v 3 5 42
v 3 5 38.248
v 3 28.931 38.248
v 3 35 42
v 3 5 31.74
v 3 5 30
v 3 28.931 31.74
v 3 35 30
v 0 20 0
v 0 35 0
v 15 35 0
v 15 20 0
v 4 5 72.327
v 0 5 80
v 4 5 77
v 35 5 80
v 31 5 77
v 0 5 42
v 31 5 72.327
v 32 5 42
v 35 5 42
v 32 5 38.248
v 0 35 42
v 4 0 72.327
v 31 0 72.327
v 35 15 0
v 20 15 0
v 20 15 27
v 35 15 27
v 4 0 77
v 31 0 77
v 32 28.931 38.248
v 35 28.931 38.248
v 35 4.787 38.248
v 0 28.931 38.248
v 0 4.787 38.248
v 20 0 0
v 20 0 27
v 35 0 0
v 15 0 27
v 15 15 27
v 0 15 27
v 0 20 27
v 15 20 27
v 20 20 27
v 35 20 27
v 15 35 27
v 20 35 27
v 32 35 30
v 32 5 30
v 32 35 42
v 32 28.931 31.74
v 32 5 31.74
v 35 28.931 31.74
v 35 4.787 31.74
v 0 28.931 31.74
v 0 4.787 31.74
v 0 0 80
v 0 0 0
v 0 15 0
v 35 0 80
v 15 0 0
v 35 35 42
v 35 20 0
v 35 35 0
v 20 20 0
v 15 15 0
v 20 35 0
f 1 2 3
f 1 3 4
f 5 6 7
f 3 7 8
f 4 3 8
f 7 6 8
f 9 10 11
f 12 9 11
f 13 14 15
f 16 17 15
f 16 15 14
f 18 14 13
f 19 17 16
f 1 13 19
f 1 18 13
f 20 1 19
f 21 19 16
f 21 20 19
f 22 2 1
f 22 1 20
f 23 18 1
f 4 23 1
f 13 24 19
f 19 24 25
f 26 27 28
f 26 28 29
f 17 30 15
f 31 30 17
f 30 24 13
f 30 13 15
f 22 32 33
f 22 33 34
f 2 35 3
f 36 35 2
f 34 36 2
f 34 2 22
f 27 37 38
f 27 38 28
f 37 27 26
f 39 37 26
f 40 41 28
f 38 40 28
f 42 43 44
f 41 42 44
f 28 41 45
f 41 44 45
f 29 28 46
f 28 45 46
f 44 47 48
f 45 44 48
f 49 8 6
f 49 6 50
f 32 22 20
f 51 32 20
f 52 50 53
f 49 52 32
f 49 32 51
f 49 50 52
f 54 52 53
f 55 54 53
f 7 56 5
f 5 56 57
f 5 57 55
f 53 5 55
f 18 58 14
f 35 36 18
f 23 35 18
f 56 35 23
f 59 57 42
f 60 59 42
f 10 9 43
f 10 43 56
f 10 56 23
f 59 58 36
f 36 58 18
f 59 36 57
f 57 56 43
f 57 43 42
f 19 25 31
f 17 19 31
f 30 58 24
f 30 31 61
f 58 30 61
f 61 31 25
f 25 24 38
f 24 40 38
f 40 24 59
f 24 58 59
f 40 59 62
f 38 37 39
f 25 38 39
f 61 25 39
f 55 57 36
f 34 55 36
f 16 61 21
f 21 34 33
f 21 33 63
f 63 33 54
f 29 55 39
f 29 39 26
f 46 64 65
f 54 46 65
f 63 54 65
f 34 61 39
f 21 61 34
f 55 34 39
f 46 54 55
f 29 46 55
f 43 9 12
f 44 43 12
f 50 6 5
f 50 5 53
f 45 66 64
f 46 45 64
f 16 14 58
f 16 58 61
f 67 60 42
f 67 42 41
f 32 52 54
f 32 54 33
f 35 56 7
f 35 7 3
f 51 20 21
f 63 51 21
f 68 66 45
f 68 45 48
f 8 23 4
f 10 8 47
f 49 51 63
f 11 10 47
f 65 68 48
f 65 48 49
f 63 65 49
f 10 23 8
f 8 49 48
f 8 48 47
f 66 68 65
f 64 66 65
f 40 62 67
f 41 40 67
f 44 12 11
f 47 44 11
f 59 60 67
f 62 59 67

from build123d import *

# Parameters (mm, degrees)
F0_W      = 15
F0_H      = 15
F1_DEPTH  = 30
F3_W      = 35
F3_H      = 35
F4_DEPTH  = 3
F5_W      = 35
F5_H      = 5
F6_DEPTH  = 50
F7_W      = 27
F7_H      = 4.6730685326
F8_DEPTH  = 25
F9_W      = 3
F9_H      = 30
F10_DEPTH = 12
F12_W     = 24.1443798877
F12_H     = 6.5082572401
F11_W     = 23.8036615774
F11_H     = 4.3690986931
F13_DEPTH = 349


with BuildPart() as f1:
    # F0 (on Top) → F1 (new body)
    with BuildSketch(Plane.XY):
        with Locations((7.5, 7.5)):
            Rectangle(F0_W, F0_H)
    extrude(amount=F1_DEPTH)



with BuildPart() as f1b:
    # F0 (on Top) → F1, piece 2 (new body)
    with BuildSketch(Plane.XY):
        with Locations((7.5, 27.5)):
            Rectangle(F0_W, F0_H)
    extrude(amount=F1_DEPTH)


with BuildPart() as f1c:
    # F0 (on Top) → F1, piece 3 (new body)
    with BuildSketch(Plane.XY):
        with Locations((27.5, 27.5)):
            Rectangle(F0_W, F0_H)
    extrude(amount=F1_DEPTH)


with BuildPart() as f1d:
    # F0 (on Top) → F1, piece 4 (new body)
    with BuildSketch(Plane.XY):
        with Locations((27.5, 7.5)):
            Rectangle(F0_W, F0_H)
    extrude(amount=F1_DEPTH)


with BuildPart() as f1_1:
    add(f1.part)

    add(f1b.part)  # F4 merges F1b

    add(f1c.part)  # F4 merges F1c

    add(f1d.part)  # F4 merges F1d
    # F3 (on face) → F4 (join)
    with BuildSketch(Plane.XY.offset(30)):
        with Locations((17.5, 17.5)):
            Rectangle(F3_W, F3_H)
    extrude(amount=-F4_DEPTH)

    # F5 (on face) → F6 (join)
    with BuildSketch(Plane.XY.offset(30)):
        with Locations((17.5, 2.5)):
            Rectangle(F5_W, F5_H)
    extrude(amount=F6_DEPTH)

    # F7 (on face) → F8 (cut)
    with BuildSketch(Plane.XZ):
        with Locations((17.5, 74.6634657337)):
            Rectangle(F7_W, F7_H)
    extrude(amount=-F8_DEPTH, mode=Mode.SUBTRACT)

    # F9 (on face) → F10 (join)
    with BuildSketch(Plane.XY.offset(30)):
        with Locations((33.5, 20)):
            Rectangle(F9_W, F9_H)
        with Locations((1.5, 20)):
            Rectangle(F9_W, F9_H)
    extrude(amount=F10_DEPTH)

    # F12 (on face) + F11 (on face) → F13 (cut)
    with BuildSketch(Plane(origin=(0, 0, 0), x_dir=(0, -1, 0), z_dir=(-1, 0, 0))):
        with Locations((-16.8588969391, 34.9941607565)):
            Rectangle(F12_W, F12_H)
    with BuildSketch(Plane.YZ.offset(35)):
        with Locations((19.5460454561, 34.8994340748)):
            Rectangle(F11_W, F11_H)
    extrude(amount=-F13_DEPTH, dir=(-1, 0, 0), mode=Mode.SUBTRACT)


solid = f1_1.part
